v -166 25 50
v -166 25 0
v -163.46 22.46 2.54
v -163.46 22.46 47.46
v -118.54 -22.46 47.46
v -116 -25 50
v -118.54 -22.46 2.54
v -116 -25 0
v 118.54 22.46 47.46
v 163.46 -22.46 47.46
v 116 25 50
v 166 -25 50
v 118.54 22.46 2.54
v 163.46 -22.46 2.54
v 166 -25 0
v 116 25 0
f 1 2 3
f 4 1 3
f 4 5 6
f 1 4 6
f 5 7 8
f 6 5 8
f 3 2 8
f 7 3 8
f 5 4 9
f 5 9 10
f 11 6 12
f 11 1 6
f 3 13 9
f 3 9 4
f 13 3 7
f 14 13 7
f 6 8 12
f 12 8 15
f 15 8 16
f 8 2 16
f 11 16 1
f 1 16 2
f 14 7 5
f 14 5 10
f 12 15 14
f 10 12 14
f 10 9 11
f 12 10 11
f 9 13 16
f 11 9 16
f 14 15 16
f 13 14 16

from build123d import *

# Parameters (mm, degrees)
F0_W     = 232
F0_H     = 50
F1_DEPTH = 50
F2_T     = -2.54


with BuildPart() as f1:
    # F0 (on Top) → F1 (new body)
    with BuildSketch(Plane.XY):
        Rectangle(F0_W, F0_H)
        Polygon((-166, 25), (-116, -25), (-116, 25), align=None)
        Polygon((116, 25), (116, -25), (166, -25), align=None)
    extrude(amount=F1_DEPTH)

    # F2
    f2_openings = [f1.faces().sort_by_distance(p)[0] for p in [
        (-141, 0, 25),
        (141, 0, 25),
    ]]
    offset(amount=F2_T, openings=f2_openings)


solid = f1.part
